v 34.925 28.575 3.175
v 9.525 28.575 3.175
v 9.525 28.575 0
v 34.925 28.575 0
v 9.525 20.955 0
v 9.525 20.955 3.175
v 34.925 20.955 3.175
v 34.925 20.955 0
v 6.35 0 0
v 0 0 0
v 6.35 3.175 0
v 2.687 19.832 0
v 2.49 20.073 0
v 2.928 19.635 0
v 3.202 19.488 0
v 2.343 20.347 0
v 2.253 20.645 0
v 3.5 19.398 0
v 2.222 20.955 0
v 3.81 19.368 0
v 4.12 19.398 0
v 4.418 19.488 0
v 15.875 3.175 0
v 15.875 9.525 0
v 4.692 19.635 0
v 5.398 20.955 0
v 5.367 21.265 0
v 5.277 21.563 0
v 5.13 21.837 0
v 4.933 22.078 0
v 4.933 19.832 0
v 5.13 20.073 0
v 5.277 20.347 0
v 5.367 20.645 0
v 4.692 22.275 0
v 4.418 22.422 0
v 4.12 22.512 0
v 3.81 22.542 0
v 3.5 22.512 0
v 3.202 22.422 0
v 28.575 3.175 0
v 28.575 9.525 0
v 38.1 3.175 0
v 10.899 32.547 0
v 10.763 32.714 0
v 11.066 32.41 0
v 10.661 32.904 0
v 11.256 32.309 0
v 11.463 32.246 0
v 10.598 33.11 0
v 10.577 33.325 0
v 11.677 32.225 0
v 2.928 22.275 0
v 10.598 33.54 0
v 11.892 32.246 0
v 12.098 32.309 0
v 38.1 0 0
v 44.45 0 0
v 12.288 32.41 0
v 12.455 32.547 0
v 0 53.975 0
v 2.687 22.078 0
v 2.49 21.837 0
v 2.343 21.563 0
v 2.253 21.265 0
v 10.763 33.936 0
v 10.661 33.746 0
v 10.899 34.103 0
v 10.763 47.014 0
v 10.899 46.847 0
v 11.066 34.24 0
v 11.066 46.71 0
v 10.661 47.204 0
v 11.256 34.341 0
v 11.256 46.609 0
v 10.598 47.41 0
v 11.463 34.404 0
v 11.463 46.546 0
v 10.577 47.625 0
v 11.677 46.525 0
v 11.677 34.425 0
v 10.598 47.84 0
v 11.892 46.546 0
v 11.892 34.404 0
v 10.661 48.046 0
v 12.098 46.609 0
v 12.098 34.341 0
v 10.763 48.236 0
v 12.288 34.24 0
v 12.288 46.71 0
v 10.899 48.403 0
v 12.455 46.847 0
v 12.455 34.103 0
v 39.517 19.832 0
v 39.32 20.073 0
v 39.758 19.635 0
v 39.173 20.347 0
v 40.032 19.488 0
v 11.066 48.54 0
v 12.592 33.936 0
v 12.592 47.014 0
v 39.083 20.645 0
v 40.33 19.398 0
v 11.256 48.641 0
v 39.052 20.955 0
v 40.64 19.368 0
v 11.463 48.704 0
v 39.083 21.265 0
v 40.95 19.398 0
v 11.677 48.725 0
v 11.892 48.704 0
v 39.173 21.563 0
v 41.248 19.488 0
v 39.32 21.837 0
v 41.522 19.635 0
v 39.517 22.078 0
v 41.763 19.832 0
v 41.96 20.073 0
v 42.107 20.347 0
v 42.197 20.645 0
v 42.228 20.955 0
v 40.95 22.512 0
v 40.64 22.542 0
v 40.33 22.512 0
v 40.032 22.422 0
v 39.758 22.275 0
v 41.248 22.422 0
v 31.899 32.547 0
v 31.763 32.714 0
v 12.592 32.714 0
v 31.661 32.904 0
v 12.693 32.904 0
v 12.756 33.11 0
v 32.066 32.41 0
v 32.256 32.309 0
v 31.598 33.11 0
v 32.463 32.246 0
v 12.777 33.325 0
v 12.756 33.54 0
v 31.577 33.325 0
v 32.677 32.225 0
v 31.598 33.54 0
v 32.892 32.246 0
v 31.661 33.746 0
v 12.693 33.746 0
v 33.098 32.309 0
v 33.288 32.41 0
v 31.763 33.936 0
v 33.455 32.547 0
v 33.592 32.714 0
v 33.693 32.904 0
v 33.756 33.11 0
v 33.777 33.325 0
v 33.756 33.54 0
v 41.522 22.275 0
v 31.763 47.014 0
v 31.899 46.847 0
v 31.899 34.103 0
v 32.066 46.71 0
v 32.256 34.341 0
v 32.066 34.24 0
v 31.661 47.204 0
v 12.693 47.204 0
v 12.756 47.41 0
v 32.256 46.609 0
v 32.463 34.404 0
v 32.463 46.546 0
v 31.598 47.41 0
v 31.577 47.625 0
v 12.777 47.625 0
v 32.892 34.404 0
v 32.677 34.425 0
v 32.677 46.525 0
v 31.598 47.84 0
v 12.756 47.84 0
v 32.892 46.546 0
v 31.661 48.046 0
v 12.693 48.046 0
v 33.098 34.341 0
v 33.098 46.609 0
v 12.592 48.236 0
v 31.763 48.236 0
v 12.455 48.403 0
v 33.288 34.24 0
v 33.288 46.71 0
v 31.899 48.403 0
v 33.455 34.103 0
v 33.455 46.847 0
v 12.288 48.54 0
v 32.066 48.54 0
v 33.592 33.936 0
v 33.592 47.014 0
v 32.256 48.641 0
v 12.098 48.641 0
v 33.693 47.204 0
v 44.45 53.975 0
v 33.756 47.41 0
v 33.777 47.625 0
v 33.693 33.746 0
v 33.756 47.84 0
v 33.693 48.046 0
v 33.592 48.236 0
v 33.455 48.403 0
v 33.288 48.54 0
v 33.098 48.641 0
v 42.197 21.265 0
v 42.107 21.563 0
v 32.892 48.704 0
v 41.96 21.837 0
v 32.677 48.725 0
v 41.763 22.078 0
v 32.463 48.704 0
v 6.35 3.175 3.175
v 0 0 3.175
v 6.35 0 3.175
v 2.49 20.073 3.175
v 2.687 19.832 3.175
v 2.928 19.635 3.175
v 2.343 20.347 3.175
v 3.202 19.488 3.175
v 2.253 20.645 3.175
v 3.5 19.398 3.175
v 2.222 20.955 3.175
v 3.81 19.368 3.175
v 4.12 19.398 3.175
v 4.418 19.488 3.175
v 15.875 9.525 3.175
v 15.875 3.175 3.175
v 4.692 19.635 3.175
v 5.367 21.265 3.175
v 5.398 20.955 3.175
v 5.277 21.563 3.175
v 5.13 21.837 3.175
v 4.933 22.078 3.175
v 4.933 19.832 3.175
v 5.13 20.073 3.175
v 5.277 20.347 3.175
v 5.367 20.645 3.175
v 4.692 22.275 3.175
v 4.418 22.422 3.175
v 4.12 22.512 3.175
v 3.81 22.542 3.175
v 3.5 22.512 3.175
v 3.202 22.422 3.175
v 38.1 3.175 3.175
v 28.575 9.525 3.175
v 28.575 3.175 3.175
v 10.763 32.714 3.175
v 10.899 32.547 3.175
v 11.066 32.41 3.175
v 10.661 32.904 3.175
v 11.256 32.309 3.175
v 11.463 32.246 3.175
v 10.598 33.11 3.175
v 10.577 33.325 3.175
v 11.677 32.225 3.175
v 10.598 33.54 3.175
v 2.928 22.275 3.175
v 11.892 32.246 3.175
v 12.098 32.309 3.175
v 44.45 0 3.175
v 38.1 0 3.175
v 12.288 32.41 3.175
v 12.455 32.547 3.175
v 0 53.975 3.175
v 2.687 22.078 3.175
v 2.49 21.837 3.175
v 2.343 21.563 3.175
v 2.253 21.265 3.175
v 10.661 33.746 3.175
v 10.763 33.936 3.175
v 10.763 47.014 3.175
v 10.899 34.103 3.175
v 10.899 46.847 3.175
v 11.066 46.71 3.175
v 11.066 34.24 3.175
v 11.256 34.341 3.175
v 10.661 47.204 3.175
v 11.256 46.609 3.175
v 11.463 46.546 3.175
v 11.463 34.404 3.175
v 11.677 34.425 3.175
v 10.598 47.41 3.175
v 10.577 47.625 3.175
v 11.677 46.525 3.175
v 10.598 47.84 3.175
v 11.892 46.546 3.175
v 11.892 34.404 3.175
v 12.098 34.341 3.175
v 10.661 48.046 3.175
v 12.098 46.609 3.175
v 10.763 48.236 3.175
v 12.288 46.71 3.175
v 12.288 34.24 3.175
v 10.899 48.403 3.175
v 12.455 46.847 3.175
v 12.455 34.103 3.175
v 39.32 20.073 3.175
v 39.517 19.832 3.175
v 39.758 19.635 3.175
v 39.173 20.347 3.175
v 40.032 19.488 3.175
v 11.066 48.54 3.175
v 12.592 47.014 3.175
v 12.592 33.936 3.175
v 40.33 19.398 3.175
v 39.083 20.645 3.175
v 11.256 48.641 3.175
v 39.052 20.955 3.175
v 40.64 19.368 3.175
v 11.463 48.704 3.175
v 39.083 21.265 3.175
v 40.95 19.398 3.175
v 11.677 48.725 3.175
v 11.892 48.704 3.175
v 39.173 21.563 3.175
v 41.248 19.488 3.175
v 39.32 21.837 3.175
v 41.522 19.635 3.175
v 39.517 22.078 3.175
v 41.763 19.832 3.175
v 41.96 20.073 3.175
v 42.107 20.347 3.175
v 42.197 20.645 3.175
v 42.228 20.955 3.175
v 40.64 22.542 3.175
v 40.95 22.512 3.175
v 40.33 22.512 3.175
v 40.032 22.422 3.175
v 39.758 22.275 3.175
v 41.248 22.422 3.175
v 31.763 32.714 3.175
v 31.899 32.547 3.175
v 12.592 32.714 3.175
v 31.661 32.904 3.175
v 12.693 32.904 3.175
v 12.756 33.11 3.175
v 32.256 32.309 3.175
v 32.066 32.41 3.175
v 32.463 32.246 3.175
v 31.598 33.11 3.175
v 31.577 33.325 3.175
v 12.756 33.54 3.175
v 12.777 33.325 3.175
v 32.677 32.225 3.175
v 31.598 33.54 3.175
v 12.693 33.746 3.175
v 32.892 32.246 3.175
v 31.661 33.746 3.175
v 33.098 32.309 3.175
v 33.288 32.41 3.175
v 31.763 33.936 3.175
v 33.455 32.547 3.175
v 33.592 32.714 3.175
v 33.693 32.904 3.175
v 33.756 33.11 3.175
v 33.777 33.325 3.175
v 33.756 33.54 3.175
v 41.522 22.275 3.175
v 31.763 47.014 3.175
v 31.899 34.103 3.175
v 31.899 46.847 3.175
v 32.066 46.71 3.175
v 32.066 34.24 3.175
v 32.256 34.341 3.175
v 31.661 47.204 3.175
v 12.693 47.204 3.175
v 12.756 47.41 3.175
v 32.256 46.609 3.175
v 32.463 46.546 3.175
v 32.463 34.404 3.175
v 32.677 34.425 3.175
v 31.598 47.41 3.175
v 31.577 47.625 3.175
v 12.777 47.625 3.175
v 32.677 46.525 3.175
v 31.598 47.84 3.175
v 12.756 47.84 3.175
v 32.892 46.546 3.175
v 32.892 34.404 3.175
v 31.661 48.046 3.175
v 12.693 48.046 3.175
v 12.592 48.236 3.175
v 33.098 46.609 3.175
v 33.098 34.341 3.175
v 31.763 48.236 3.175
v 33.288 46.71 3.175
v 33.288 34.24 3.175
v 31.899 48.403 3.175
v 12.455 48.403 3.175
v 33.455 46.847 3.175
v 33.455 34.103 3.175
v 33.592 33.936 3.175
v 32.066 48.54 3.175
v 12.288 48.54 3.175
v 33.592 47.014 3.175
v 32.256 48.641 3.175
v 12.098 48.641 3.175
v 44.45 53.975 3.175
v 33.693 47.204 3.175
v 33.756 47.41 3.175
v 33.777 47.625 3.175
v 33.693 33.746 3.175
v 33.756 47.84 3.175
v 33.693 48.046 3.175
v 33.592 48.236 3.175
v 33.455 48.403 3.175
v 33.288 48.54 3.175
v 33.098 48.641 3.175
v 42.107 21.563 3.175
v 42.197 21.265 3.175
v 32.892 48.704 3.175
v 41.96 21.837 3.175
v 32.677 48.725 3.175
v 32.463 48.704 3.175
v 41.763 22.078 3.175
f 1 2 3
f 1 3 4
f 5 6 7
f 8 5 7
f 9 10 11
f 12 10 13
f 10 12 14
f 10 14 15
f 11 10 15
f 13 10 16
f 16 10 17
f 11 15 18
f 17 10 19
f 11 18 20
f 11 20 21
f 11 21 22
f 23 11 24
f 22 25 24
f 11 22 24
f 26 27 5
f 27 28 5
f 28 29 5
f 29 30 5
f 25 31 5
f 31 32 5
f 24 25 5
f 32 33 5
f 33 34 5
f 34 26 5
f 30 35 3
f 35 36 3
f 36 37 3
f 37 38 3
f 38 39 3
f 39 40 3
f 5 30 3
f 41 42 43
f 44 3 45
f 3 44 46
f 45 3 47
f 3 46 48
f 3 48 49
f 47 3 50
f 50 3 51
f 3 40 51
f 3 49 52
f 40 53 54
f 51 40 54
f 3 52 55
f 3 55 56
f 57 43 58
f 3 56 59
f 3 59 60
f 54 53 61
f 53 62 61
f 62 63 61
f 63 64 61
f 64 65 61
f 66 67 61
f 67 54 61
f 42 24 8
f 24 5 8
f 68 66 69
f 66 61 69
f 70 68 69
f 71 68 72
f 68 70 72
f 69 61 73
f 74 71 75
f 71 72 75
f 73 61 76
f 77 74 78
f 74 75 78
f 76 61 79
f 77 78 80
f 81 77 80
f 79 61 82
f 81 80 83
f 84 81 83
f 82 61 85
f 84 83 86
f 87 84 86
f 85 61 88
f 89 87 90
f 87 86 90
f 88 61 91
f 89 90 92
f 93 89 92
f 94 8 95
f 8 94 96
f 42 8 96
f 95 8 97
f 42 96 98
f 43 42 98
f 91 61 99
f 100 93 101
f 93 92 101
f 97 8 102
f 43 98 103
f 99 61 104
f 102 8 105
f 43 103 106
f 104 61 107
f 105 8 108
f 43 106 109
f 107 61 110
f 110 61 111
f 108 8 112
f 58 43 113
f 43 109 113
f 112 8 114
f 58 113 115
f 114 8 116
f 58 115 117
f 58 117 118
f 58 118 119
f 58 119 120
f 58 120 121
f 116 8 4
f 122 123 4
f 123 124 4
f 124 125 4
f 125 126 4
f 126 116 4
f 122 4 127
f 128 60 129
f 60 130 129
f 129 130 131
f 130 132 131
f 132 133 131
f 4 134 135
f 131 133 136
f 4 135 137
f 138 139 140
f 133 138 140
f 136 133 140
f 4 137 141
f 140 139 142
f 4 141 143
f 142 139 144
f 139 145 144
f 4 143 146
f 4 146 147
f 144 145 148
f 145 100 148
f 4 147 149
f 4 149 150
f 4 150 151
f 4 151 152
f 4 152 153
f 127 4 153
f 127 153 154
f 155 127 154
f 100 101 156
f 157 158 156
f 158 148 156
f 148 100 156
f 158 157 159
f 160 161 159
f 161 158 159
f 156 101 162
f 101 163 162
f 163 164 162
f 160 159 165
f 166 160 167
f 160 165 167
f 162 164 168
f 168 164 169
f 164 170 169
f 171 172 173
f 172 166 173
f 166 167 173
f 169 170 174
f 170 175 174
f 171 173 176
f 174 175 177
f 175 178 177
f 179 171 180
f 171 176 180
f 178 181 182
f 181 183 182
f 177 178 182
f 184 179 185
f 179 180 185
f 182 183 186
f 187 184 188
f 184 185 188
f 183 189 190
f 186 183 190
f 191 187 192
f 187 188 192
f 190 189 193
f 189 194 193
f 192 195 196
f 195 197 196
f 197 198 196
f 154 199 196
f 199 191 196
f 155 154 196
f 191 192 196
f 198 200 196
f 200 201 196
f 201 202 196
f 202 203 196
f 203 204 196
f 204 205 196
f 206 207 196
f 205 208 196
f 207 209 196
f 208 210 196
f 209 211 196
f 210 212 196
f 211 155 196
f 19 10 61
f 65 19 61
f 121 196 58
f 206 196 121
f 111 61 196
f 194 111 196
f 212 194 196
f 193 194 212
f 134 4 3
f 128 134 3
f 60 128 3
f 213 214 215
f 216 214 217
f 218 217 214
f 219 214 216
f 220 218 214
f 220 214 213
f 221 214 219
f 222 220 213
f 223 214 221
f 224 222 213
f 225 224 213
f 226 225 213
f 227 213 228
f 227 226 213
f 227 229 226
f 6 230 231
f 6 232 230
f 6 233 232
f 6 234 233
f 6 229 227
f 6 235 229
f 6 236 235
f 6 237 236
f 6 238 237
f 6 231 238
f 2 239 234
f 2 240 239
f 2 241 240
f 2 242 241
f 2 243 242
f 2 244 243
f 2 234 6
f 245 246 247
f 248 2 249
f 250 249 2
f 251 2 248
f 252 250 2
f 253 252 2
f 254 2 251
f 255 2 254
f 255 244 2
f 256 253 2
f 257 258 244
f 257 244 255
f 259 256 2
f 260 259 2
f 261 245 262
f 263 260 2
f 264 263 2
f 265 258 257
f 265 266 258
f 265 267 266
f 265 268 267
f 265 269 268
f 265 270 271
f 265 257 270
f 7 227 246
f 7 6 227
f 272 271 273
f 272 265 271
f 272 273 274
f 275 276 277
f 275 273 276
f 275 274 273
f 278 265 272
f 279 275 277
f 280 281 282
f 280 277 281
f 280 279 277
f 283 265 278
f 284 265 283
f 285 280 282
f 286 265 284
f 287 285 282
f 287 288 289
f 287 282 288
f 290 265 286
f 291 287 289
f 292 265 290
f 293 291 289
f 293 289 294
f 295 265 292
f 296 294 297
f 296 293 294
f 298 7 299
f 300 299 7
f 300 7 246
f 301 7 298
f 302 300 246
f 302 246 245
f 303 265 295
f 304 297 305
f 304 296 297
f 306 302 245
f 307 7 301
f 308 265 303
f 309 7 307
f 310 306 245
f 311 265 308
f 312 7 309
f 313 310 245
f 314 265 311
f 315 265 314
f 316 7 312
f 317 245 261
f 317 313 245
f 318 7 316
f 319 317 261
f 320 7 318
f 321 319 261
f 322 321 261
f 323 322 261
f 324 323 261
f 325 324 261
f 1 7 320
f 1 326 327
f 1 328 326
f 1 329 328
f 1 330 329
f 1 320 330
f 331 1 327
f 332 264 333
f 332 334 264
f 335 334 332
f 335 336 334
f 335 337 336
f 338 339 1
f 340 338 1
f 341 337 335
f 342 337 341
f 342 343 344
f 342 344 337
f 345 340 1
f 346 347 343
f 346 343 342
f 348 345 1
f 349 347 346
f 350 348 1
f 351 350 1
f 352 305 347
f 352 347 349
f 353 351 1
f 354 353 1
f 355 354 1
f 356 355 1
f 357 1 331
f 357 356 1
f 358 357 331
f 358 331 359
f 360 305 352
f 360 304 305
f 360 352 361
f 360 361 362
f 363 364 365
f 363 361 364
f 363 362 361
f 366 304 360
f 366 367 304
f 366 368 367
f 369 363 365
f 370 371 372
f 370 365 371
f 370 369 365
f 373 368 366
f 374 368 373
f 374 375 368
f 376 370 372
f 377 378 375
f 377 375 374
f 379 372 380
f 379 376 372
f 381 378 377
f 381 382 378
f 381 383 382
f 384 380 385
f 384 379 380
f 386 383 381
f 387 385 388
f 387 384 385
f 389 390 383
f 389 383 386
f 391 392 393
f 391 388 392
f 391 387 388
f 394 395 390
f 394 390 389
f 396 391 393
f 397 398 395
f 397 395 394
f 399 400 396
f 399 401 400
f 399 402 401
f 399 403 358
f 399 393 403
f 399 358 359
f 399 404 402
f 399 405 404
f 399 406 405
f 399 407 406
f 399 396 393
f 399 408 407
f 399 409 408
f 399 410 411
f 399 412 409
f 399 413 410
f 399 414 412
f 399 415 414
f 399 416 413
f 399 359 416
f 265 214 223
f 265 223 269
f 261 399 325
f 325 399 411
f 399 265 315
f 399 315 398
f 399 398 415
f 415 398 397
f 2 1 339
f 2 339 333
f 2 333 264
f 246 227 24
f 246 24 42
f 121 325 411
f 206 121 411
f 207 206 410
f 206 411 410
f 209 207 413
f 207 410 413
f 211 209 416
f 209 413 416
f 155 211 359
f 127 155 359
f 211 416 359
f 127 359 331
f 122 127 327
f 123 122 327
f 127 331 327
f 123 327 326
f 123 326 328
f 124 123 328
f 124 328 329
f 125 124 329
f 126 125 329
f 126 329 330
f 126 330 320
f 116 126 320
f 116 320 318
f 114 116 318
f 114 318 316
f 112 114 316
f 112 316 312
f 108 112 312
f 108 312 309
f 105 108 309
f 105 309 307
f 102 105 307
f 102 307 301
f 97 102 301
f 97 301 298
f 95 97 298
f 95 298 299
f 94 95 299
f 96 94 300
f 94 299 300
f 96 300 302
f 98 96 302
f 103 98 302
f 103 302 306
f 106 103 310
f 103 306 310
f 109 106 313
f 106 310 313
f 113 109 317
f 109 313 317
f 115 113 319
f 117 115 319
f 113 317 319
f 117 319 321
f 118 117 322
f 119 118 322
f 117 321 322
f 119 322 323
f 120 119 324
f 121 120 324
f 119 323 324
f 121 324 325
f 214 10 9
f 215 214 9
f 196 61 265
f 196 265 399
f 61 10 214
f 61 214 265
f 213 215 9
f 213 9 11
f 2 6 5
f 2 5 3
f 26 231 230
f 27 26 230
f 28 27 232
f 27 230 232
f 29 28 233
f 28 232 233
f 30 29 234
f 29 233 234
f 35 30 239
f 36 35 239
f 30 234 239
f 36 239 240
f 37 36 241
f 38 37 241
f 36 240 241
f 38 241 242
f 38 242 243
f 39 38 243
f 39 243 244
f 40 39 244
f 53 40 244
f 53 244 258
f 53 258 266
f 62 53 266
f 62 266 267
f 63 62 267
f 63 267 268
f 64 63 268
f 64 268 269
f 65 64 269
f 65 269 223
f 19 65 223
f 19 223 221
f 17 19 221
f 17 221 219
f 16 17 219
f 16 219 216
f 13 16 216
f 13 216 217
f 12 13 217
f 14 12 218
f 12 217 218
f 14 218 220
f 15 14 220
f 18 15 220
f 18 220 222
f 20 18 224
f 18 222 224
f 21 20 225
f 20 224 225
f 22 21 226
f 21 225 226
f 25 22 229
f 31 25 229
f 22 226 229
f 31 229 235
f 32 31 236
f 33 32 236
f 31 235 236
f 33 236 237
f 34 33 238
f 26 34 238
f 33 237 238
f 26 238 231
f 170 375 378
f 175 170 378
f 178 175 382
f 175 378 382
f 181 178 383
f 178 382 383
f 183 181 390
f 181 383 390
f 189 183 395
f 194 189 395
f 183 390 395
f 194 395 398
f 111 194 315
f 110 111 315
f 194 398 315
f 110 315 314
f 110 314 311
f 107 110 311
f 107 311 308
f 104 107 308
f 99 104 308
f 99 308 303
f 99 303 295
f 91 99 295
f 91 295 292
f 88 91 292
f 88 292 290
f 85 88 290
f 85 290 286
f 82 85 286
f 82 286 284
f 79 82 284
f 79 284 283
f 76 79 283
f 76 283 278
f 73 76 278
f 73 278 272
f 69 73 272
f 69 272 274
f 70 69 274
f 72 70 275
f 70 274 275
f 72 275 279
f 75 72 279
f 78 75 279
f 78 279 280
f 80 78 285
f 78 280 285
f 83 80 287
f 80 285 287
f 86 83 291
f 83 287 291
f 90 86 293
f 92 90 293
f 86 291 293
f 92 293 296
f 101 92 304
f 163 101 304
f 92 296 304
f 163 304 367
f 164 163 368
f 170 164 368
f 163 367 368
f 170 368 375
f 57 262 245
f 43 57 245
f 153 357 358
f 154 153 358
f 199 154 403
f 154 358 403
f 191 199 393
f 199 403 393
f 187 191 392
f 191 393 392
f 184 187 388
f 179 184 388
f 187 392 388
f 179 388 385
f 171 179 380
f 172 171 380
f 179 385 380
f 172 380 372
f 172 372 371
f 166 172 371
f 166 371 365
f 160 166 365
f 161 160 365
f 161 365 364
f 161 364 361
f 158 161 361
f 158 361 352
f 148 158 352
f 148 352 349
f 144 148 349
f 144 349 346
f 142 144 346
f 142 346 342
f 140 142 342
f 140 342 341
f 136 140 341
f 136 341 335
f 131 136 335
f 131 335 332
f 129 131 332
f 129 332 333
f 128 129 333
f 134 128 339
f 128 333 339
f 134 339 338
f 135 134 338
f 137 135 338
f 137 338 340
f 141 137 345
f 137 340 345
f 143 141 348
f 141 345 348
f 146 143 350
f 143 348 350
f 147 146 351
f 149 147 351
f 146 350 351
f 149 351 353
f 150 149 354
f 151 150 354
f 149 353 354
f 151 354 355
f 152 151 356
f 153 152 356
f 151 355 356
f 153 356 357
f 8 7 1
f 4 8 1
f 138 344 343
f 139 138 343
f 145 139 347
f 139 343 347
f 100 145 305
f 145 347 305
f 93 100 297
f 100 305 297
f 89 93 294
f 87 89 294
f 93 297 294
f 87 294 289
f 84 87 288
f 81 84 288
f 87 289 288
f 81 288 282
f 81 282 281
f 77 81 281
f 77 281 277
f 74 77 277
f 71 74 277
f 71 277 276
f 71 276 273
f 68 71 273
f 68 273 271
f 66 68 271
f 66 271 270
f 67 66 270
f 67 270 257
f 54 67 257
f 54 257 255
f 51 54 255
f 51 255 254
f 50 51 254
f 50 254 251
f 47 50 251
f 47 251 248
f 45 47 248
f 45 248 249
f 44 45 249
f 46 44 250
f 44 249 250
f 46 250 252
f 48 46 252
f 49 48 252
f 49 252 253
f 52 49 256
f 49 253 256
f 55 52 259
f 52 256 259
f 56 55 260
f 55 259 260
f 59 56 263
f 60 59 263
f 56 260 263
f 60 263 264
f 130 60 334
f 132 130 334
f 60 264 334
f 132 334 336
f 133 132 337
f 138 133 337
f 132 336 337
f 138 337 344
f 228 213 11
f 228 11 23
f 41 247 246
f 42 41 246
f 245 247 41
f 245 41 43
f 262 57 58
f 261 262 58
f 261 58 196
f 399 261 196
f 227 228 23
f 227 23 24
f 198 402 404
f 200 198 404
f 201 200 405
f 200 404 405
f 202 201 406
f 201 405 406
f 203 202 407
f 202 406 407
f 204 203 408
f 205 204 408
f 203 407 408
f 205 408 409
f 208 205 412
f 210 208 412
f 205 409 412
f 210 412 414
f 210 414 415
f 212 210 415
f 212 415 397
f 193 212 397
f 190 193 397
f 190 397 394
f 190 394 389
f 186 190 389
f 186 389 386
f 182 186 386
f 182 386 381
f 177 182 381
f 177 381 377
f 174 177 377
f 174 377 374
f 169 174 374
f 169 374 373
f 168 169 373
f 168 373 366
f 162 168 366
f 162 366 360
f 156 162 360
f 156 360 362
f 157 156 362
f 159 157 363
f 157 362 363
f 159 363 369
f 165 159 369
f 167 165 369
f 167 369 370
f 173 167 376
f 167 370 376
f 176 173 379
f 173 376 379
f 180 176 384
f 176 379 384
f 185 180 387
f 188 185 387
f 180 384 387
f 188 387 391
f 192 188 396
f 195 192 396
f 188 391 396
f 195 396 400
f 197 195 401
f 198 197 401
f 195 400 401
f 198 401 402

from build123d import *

# Parameters (mm, degrees)
SKETCH1_W           = 44.45
SKETCH1_H           = 53.975
BOSS_EXTRUDE1_DEPTH = 3.175
SKETCH2_W           = 31.75
SKETCH2_H           = 3.175
CUT_EXTRUDE1_DEPTH  = 4.175
SKETCH3_R           = 1.5875
SKETCH3_R_2         = 1.1
SKETCH3_W           = 12.7
SKETCH3_H           = 6.35
SKETCH3_W_2         = 25.4
SKETCH3_H_2         = 7.62
CUT_EXTRUDE2_DEPTH  = 4.175


with BuildPart() as part:
    # Sketch1 → Boss-Extrude1 (new body)
    with BuildSketch(Plane.XY):
        with Locations((22.225, 26.9875)):
            Rectangle(SKETCH1_W, SKETCH1_H)
    extrude(amount=BOSS_EXTRUDE1_DEPTH)

    # Sketch2 → Cut-Extrude1 (cut, through all)
    with BuildSketch(Plane.XY.offset(3.175)):
        with Locations((22.225, 1.5875)):
            Rectangle(SKETCH2_W, SKETCH2_H)
    extrude(amount=-CUT_EXTRUDE1_DEPTH, mode=Mode.SUBTRACT)

    # Sketch3 → Cut-Extrude2 (cut, through all)
    with BuildSketch(Plane.XY.offset(3.175)):
        with Locations((3.81, 20.955)):
            Circle(SKETCH3_R)
        with Locations((40.64, 20.955)):
            Circle(SKETCH3_R)
        with Locations((11.677212596, 47.625)):
            Circle(SKETCH3_R_2)
        with Locations((11.677212596, 33.325)):
            Circle(SKETCH3_R_2)
        with Locations((32.677212596, 47.625)):
            Circle(SKETCH3_R_2)
        with Locations((32.677212596, 33.325)):
            Circle(SKETCH3_R_2)
        with Locations((22.225, 6.35)):
            Rectangle(SKETCH3_W, SKETCH3_H)
        with Locations((22.225, 24.765)):
            Rectangle(SKETCH3_W_2, SKETCH3_H_2)
    extrude(amount=-CUT_EXTRUDE2_DEPTH, mode=Mode.SUBTRACT)


solid = part.part
